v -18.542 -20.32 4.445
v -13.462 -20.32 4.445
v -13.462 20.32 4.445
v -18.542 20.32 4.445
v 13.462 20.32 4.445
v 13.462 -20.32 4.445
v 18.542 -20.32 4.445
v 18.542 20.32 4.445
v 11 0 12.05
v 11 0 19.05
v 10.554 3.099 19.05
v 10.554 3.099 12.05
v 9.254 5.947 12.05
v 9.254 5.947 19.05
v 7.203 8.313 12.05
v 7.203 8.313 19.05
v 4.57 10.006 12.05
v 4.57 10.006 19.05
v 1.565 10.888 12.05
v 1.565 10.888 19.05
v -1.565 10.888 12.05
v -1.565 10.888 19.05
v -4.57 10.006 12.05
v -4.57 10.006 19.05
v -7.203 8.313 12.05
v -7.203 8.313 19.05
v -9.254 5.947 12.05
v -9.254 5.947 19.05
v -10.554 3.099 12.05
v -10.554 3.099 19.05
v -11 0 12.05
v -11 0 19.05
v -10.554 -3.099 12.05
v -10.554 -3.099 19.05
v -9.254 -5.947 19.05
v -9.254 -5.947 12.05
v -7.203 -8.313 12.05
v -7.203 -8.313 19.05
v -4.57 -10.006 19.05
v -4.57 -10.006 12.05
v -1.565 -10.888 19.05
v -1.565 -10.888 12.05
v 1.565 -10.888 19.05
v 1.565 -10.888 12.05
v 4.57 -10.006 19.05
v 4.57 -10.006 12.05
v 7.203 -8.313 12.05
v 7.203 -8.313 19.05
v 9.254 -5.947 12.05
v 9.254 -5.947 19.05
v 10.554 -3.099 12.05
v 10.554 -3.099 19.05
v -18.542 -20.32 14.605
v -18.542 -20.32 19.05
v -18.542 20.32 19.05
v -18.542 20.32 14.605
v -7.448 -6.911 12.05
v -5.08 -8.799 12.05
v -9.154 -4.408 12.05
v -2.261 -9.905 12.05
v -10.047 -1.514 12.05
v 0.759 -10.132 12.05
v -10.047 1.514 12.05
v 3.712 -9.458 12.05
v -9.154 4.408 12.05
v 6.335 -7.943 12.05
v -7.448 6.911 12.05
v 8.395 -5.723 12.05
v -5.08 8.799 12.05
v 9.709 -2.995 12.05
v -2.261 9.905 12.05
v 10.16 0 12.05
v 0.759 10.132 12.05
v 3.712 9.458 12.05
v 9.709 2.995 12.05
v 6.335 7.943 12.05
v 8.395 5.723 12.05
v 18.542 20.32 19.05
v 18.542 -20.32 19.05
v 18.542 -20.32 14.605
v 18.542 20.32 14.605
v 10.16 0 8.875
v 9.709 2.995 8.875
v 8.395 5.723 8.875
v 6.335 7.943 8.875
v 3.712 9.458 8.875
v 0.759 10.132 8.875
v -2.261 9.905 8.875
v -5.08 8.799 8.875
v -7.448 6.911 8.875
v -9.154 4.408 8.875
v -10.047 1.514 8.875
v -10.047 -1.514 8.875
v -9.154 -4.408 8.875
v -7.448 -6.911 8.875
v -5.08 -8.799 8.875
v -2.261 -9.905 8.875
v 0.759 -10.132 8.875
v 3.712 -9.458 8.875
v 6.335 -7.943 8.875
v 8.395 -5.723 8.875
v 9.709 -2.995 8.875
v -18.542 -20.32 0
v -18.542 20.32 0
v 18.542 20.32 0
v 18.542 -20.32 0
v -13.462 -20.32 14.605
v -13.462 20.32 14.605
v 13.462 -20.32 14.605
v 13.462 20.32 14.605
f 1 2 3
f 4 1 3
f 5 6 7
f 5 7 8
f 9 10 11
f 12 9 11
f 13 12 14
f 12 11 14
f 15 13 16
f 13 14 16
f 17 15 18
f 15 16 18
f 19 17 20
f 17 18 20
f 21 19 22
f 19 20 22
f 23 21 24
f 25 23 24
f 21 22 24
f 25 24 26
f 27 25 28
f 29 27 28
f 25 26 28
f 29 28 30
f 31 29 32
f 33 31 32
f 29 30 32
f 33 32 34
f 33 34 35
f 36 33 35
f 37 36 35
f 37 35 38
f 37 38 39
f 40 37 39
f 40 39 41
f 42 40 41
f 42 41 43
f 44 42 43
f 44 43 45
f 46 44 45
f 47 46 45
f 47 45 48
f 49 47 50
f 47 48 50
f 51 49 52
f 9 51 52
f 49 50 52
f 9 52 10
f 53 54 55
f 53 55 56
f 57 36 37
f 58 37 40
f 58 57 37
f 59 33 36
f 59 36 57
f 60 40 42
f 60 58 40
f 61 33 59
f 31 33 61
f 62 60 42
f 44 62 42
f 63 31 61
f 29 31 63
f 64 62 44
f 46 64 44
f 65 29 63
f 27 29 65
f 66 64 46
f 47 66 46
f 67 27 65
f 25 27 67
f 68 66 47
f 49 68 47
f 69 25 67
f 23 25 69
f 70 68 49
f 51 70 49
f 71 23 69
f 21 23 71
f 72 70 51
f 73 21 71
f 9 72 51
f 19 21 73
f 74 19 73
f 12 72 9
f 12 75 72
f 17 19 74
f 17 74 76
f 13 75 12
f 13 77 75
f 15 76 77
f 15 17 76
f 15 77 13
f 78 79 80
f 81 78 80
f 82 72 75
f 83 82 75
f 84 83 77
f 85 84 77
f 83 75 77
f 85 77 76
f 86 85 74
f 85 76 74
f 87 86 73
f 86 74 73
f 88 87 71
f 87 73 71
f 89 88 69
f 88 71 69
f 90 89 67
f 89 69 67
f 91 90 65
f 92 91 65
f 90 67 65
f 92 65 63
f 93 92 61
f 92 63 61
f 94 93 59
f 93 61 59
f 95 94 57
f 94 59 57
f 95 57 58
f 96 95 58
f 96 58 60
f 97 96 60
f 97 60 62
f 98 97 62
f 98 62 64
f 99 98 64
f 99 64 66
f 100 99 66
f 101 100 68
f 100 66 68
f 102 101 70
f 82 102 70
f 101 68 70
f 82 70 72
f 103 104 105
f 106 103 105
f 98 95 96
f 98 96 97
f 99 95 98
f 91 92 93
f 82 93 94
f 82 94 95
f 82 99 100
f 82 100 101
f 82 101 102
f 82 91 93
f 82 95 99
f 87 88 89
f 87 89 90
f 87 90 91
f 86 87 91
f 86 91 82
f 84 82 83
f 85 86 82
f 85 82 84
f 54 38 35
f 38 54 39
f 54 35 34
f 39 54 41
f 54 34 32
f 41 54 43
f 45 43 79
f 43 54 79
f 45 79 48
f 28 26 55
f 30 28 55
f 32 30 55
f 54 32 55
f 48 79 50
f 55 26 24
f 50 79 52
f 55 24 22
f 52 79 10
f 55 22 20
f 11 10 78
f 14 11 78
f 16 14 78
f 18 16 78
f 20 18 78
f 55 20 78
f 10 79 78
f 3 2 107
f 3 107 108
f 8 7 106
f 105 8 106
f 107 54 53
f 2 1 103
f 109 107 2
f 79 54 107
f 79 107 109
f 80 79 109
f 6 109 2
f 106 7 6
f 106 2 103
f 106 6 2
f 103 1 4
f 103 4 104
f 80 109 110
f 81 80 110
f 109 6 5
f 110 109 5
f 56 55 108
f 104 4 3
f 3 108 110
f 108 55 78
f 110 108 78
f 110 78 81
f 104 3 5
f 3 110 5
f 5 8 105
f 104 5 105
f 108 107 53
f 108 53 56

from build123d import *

# Parameters (mm, degrees)
SKETCH1_W           = 26.924
SKETCH1_H           = 40.64
BOSS_EXTRUDE1_DEPTH = 19.05
SKETCH2_W           = 4.445
SKETCH2_H           = 40.64
BOSS_EXTRUDE2_DEPTH = 5.08
SKETCH3_R           = 11
CUT_EXTRUDE1_DEPTH  = 7
SKETCH4_R           = 10.16
CUT_EXTRUDE2_DEPTH  = 3.175


with BuildPart() as part:
    # Sketch1 → Boss-Extrude1 (new body)
    with BuildSketch(Plane.XY):
        Rectangle(SKETCH1_W, SKETCH1_H)
    extrude(amount=BOSS_EXTRUDE1_DEPTH)

    # Sketch2 → Boss-Extrude2 (add)
    with BuildSketch(Plane(origin=(13.462, 0, 0), x_dir=(0, 0, -1), z_dir=(1, 0, 0))):
        with Locations((-16.8275, 0)):
            Rectangle(SKETCH2_W, SKETCH2_H)
        with Locations((-2.2225, 0)):
            Rectangle(SKETCH2_W, SKETCH2_H)
    boss_extrude2 = extrude(amount=BOSS_EXTRUDE2_DEPTH)

    # Mirror1: Boss-Extrude2 across plane
    add(boss_extrude2.mirror(Plane(origin=(0, 0, 0), x_dir=(0, 0, 1), z_dir=(1, 0, 0))))

    # Sketch3 → Cut-Extrude1 (cut)
    with BuildSketch(Plane.XY.offset(19.05)):
        Circle(SKETCH3_R)
    extrude(amount=-CUT_EXTRUDE1_DEPTH, mode=Mode.SUBTRACT)

    # Sketch4 → Cut-Extrude2 (cut)
    with BuildSketch(Plane.XY.offset(12.05)):
        Circle(SKETCH4_R)
    extrude(amount=-CUT_EXTRUDE2_DEPTH, mode=Mode.SUBTRACT)


solid = part.part
